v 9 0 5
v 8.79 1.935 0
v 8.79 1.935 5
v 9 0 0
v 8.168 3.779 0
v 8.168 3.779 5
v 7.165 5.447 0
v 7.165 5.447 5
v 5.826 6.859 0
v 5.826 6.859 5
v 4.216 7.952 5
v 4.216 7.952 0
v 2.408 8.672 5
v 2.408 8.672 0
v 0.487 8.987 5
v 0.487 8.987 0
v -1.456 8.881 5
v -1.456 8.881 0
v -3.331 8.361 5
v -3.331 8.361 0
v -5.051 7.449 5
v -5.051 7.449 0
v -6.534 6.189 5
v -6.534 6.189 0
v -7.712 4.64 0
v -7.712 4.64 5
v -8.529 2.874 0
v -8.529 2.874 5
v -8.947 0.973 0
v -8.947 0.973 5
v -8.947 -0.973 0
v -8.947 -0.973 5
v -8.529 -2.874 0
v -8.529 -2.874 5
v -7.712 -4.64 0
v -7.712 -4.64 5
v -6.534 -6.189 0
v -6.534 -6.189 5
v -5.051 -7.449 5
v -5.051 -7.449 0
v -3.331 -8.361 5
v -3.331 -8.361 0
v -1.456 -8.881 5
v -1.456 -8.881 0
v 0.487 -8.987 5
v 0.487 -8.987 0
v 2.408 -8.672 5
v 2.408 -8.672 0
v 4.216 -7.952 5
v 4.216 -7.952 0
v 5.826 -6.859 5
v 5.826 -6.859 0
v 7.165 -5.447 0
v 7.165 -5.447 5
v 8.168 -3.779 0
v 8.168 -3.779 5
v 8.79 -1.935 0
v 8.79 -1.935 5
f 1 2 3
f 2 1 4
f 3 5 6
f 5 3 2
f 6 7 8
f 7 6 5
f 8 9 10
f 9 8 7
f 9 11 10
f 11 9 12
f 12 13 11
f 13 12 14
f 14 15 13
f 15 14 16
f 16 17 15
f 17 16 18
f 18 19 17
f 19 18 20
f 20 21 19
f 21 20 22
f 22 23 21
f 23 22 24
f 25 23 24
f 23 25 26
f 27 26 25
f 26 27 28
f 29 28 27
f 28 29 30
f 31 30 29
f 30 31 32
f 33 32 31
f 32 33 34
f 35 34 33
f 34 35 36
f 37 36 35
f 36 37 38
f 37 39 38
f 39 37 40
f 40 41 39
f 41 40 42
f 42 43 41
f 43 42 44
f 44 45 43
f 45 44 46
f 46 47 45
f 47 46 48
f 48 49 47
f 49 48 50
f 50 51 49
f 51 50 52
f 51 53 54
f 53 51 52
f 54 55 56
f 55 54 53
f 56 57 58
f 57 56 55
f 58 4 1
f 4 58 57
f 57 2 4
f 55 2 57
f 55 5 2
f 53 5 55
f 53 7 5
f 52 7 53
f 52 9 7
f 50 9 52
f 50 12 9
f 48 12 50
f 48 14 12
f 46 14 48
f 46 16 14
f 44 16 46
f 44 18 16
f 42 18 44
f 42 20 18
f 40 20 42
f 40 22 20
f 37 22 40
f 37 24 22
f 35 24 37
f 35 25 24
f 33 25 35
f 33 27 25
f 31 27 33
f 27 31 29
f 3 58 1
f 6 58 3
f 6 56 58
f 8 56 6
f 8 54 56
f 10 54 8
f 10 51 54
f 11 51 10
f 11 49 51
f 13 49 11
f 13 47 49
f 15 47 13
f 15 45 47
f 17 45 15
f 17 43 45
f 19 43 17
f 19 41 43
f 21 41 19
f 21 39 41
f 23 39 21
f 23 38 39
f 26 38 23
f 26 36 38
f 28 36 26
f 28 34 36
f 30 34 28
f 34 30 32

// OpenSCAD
// Generated by SolidPython 1.0.1 on 2020-07-29 00:46:44


cylinder(h = 5, r1 = 9, r2 = 9);
/***********************************************
*********      SolidPython code:      **********
************************************************
 
# import packages: SolidPython
from solid import *
from solid.utils import *
from itertools import chain, combinations, permutations


class Resize:

    def __init__(self, scad_file):
        self.scad_file = scad_file
        #self.scad_file = import_scad(scad_file)
        # cone/cylinder param:
        self.r1 = 0
        self.r2 = 0
        self.h = 0
        # rectangular prism param:
        self.w = 0
        self.l = 0
        # ellipse param:
        self.r = 0

    # import OpenScad code (file name corresponds to shape)


    # classify shape + parameters
    def assign(self, param1, param2, param3):
        if self.scad_file == 'cone.scad':
            self.r1 = param1
            self.r2 = param2
            self.h = param3
        elif self.scad_file == 'cylinder.scad':
            self.r1 = param1
            self.r2 = param2
            self.h = param3
        elif self.scad_file == 'rectangularPrism.scad':
            self.h = param1
            self.l = param2
            self.w = param3
        else:
            self.r = param1
            self.h = param2

    # resize parameters
    def iterate(self):
        x = range(3, 20, 2)
        i = 1
        if self.scad_file == 'cone.scad':
            tempList = list(permutations(x, 2))
            for temp in tempList:
                param1 = temp[0]
                param2 = temp[1]
                filepath = 'produced_scad_files/' + 'cone' + str(param1) + '_' + str(param2) + '_' + '.scad'
                scad_render_to_file(cylinder(h=param1, r1=param2, r2=0), filepath)

        elif self.scad_file == 'cylinder.scad':
            tempList = list(permutations(x, 3))
            for temp in tempList:
                param1 = temp[0]
                param2 = temp[1]
                filepath = 'produced_scad_files/' + 'cylinder' + str(param1) + '_' + str(param2) + '_' + '.scad'
                scad_render_to_file(cylinder(h=param1, r1=param2, r2=param2), filepath)

        elif self.scad_file == 'rectangularPrism.scad':
            tempList = list(permutations(x, 3))
            for temp in tempList:
                param1 = temp[0]
                param2 = temp[1]
                param3 = temp[2]
                filepath = 'produced_scad_files/' + 'rectangularPrism' + str(param1) + '_' + str(param2) + '_' + str(
                    param3) + '.scad'
                scad_render_to_file(cube(size=(param1, param2, param3)), filepath)

        elif self.scad_file == 'ellipse.scad':
            tempList = list(permutations(x, 4))
            for temp in tempList:
                param1 = temp[0]
                param2 = temp[1]
                param3 = temp[2]
                param4 = temp[3]
                filepath = 'produced_scad_files/' + 'ellipse' + str(param1) + '_' + str(param2) + '_' + str(param3) + '_' + str(param4) + '.scad'
                scad_render_to_file(scale([param1, param2, param3])(sphere(r=param4)), filepath)

    def render_to_scadfile(self):
        scad_render_to_file(scad, 'example.scad') 
 
************************************************/
